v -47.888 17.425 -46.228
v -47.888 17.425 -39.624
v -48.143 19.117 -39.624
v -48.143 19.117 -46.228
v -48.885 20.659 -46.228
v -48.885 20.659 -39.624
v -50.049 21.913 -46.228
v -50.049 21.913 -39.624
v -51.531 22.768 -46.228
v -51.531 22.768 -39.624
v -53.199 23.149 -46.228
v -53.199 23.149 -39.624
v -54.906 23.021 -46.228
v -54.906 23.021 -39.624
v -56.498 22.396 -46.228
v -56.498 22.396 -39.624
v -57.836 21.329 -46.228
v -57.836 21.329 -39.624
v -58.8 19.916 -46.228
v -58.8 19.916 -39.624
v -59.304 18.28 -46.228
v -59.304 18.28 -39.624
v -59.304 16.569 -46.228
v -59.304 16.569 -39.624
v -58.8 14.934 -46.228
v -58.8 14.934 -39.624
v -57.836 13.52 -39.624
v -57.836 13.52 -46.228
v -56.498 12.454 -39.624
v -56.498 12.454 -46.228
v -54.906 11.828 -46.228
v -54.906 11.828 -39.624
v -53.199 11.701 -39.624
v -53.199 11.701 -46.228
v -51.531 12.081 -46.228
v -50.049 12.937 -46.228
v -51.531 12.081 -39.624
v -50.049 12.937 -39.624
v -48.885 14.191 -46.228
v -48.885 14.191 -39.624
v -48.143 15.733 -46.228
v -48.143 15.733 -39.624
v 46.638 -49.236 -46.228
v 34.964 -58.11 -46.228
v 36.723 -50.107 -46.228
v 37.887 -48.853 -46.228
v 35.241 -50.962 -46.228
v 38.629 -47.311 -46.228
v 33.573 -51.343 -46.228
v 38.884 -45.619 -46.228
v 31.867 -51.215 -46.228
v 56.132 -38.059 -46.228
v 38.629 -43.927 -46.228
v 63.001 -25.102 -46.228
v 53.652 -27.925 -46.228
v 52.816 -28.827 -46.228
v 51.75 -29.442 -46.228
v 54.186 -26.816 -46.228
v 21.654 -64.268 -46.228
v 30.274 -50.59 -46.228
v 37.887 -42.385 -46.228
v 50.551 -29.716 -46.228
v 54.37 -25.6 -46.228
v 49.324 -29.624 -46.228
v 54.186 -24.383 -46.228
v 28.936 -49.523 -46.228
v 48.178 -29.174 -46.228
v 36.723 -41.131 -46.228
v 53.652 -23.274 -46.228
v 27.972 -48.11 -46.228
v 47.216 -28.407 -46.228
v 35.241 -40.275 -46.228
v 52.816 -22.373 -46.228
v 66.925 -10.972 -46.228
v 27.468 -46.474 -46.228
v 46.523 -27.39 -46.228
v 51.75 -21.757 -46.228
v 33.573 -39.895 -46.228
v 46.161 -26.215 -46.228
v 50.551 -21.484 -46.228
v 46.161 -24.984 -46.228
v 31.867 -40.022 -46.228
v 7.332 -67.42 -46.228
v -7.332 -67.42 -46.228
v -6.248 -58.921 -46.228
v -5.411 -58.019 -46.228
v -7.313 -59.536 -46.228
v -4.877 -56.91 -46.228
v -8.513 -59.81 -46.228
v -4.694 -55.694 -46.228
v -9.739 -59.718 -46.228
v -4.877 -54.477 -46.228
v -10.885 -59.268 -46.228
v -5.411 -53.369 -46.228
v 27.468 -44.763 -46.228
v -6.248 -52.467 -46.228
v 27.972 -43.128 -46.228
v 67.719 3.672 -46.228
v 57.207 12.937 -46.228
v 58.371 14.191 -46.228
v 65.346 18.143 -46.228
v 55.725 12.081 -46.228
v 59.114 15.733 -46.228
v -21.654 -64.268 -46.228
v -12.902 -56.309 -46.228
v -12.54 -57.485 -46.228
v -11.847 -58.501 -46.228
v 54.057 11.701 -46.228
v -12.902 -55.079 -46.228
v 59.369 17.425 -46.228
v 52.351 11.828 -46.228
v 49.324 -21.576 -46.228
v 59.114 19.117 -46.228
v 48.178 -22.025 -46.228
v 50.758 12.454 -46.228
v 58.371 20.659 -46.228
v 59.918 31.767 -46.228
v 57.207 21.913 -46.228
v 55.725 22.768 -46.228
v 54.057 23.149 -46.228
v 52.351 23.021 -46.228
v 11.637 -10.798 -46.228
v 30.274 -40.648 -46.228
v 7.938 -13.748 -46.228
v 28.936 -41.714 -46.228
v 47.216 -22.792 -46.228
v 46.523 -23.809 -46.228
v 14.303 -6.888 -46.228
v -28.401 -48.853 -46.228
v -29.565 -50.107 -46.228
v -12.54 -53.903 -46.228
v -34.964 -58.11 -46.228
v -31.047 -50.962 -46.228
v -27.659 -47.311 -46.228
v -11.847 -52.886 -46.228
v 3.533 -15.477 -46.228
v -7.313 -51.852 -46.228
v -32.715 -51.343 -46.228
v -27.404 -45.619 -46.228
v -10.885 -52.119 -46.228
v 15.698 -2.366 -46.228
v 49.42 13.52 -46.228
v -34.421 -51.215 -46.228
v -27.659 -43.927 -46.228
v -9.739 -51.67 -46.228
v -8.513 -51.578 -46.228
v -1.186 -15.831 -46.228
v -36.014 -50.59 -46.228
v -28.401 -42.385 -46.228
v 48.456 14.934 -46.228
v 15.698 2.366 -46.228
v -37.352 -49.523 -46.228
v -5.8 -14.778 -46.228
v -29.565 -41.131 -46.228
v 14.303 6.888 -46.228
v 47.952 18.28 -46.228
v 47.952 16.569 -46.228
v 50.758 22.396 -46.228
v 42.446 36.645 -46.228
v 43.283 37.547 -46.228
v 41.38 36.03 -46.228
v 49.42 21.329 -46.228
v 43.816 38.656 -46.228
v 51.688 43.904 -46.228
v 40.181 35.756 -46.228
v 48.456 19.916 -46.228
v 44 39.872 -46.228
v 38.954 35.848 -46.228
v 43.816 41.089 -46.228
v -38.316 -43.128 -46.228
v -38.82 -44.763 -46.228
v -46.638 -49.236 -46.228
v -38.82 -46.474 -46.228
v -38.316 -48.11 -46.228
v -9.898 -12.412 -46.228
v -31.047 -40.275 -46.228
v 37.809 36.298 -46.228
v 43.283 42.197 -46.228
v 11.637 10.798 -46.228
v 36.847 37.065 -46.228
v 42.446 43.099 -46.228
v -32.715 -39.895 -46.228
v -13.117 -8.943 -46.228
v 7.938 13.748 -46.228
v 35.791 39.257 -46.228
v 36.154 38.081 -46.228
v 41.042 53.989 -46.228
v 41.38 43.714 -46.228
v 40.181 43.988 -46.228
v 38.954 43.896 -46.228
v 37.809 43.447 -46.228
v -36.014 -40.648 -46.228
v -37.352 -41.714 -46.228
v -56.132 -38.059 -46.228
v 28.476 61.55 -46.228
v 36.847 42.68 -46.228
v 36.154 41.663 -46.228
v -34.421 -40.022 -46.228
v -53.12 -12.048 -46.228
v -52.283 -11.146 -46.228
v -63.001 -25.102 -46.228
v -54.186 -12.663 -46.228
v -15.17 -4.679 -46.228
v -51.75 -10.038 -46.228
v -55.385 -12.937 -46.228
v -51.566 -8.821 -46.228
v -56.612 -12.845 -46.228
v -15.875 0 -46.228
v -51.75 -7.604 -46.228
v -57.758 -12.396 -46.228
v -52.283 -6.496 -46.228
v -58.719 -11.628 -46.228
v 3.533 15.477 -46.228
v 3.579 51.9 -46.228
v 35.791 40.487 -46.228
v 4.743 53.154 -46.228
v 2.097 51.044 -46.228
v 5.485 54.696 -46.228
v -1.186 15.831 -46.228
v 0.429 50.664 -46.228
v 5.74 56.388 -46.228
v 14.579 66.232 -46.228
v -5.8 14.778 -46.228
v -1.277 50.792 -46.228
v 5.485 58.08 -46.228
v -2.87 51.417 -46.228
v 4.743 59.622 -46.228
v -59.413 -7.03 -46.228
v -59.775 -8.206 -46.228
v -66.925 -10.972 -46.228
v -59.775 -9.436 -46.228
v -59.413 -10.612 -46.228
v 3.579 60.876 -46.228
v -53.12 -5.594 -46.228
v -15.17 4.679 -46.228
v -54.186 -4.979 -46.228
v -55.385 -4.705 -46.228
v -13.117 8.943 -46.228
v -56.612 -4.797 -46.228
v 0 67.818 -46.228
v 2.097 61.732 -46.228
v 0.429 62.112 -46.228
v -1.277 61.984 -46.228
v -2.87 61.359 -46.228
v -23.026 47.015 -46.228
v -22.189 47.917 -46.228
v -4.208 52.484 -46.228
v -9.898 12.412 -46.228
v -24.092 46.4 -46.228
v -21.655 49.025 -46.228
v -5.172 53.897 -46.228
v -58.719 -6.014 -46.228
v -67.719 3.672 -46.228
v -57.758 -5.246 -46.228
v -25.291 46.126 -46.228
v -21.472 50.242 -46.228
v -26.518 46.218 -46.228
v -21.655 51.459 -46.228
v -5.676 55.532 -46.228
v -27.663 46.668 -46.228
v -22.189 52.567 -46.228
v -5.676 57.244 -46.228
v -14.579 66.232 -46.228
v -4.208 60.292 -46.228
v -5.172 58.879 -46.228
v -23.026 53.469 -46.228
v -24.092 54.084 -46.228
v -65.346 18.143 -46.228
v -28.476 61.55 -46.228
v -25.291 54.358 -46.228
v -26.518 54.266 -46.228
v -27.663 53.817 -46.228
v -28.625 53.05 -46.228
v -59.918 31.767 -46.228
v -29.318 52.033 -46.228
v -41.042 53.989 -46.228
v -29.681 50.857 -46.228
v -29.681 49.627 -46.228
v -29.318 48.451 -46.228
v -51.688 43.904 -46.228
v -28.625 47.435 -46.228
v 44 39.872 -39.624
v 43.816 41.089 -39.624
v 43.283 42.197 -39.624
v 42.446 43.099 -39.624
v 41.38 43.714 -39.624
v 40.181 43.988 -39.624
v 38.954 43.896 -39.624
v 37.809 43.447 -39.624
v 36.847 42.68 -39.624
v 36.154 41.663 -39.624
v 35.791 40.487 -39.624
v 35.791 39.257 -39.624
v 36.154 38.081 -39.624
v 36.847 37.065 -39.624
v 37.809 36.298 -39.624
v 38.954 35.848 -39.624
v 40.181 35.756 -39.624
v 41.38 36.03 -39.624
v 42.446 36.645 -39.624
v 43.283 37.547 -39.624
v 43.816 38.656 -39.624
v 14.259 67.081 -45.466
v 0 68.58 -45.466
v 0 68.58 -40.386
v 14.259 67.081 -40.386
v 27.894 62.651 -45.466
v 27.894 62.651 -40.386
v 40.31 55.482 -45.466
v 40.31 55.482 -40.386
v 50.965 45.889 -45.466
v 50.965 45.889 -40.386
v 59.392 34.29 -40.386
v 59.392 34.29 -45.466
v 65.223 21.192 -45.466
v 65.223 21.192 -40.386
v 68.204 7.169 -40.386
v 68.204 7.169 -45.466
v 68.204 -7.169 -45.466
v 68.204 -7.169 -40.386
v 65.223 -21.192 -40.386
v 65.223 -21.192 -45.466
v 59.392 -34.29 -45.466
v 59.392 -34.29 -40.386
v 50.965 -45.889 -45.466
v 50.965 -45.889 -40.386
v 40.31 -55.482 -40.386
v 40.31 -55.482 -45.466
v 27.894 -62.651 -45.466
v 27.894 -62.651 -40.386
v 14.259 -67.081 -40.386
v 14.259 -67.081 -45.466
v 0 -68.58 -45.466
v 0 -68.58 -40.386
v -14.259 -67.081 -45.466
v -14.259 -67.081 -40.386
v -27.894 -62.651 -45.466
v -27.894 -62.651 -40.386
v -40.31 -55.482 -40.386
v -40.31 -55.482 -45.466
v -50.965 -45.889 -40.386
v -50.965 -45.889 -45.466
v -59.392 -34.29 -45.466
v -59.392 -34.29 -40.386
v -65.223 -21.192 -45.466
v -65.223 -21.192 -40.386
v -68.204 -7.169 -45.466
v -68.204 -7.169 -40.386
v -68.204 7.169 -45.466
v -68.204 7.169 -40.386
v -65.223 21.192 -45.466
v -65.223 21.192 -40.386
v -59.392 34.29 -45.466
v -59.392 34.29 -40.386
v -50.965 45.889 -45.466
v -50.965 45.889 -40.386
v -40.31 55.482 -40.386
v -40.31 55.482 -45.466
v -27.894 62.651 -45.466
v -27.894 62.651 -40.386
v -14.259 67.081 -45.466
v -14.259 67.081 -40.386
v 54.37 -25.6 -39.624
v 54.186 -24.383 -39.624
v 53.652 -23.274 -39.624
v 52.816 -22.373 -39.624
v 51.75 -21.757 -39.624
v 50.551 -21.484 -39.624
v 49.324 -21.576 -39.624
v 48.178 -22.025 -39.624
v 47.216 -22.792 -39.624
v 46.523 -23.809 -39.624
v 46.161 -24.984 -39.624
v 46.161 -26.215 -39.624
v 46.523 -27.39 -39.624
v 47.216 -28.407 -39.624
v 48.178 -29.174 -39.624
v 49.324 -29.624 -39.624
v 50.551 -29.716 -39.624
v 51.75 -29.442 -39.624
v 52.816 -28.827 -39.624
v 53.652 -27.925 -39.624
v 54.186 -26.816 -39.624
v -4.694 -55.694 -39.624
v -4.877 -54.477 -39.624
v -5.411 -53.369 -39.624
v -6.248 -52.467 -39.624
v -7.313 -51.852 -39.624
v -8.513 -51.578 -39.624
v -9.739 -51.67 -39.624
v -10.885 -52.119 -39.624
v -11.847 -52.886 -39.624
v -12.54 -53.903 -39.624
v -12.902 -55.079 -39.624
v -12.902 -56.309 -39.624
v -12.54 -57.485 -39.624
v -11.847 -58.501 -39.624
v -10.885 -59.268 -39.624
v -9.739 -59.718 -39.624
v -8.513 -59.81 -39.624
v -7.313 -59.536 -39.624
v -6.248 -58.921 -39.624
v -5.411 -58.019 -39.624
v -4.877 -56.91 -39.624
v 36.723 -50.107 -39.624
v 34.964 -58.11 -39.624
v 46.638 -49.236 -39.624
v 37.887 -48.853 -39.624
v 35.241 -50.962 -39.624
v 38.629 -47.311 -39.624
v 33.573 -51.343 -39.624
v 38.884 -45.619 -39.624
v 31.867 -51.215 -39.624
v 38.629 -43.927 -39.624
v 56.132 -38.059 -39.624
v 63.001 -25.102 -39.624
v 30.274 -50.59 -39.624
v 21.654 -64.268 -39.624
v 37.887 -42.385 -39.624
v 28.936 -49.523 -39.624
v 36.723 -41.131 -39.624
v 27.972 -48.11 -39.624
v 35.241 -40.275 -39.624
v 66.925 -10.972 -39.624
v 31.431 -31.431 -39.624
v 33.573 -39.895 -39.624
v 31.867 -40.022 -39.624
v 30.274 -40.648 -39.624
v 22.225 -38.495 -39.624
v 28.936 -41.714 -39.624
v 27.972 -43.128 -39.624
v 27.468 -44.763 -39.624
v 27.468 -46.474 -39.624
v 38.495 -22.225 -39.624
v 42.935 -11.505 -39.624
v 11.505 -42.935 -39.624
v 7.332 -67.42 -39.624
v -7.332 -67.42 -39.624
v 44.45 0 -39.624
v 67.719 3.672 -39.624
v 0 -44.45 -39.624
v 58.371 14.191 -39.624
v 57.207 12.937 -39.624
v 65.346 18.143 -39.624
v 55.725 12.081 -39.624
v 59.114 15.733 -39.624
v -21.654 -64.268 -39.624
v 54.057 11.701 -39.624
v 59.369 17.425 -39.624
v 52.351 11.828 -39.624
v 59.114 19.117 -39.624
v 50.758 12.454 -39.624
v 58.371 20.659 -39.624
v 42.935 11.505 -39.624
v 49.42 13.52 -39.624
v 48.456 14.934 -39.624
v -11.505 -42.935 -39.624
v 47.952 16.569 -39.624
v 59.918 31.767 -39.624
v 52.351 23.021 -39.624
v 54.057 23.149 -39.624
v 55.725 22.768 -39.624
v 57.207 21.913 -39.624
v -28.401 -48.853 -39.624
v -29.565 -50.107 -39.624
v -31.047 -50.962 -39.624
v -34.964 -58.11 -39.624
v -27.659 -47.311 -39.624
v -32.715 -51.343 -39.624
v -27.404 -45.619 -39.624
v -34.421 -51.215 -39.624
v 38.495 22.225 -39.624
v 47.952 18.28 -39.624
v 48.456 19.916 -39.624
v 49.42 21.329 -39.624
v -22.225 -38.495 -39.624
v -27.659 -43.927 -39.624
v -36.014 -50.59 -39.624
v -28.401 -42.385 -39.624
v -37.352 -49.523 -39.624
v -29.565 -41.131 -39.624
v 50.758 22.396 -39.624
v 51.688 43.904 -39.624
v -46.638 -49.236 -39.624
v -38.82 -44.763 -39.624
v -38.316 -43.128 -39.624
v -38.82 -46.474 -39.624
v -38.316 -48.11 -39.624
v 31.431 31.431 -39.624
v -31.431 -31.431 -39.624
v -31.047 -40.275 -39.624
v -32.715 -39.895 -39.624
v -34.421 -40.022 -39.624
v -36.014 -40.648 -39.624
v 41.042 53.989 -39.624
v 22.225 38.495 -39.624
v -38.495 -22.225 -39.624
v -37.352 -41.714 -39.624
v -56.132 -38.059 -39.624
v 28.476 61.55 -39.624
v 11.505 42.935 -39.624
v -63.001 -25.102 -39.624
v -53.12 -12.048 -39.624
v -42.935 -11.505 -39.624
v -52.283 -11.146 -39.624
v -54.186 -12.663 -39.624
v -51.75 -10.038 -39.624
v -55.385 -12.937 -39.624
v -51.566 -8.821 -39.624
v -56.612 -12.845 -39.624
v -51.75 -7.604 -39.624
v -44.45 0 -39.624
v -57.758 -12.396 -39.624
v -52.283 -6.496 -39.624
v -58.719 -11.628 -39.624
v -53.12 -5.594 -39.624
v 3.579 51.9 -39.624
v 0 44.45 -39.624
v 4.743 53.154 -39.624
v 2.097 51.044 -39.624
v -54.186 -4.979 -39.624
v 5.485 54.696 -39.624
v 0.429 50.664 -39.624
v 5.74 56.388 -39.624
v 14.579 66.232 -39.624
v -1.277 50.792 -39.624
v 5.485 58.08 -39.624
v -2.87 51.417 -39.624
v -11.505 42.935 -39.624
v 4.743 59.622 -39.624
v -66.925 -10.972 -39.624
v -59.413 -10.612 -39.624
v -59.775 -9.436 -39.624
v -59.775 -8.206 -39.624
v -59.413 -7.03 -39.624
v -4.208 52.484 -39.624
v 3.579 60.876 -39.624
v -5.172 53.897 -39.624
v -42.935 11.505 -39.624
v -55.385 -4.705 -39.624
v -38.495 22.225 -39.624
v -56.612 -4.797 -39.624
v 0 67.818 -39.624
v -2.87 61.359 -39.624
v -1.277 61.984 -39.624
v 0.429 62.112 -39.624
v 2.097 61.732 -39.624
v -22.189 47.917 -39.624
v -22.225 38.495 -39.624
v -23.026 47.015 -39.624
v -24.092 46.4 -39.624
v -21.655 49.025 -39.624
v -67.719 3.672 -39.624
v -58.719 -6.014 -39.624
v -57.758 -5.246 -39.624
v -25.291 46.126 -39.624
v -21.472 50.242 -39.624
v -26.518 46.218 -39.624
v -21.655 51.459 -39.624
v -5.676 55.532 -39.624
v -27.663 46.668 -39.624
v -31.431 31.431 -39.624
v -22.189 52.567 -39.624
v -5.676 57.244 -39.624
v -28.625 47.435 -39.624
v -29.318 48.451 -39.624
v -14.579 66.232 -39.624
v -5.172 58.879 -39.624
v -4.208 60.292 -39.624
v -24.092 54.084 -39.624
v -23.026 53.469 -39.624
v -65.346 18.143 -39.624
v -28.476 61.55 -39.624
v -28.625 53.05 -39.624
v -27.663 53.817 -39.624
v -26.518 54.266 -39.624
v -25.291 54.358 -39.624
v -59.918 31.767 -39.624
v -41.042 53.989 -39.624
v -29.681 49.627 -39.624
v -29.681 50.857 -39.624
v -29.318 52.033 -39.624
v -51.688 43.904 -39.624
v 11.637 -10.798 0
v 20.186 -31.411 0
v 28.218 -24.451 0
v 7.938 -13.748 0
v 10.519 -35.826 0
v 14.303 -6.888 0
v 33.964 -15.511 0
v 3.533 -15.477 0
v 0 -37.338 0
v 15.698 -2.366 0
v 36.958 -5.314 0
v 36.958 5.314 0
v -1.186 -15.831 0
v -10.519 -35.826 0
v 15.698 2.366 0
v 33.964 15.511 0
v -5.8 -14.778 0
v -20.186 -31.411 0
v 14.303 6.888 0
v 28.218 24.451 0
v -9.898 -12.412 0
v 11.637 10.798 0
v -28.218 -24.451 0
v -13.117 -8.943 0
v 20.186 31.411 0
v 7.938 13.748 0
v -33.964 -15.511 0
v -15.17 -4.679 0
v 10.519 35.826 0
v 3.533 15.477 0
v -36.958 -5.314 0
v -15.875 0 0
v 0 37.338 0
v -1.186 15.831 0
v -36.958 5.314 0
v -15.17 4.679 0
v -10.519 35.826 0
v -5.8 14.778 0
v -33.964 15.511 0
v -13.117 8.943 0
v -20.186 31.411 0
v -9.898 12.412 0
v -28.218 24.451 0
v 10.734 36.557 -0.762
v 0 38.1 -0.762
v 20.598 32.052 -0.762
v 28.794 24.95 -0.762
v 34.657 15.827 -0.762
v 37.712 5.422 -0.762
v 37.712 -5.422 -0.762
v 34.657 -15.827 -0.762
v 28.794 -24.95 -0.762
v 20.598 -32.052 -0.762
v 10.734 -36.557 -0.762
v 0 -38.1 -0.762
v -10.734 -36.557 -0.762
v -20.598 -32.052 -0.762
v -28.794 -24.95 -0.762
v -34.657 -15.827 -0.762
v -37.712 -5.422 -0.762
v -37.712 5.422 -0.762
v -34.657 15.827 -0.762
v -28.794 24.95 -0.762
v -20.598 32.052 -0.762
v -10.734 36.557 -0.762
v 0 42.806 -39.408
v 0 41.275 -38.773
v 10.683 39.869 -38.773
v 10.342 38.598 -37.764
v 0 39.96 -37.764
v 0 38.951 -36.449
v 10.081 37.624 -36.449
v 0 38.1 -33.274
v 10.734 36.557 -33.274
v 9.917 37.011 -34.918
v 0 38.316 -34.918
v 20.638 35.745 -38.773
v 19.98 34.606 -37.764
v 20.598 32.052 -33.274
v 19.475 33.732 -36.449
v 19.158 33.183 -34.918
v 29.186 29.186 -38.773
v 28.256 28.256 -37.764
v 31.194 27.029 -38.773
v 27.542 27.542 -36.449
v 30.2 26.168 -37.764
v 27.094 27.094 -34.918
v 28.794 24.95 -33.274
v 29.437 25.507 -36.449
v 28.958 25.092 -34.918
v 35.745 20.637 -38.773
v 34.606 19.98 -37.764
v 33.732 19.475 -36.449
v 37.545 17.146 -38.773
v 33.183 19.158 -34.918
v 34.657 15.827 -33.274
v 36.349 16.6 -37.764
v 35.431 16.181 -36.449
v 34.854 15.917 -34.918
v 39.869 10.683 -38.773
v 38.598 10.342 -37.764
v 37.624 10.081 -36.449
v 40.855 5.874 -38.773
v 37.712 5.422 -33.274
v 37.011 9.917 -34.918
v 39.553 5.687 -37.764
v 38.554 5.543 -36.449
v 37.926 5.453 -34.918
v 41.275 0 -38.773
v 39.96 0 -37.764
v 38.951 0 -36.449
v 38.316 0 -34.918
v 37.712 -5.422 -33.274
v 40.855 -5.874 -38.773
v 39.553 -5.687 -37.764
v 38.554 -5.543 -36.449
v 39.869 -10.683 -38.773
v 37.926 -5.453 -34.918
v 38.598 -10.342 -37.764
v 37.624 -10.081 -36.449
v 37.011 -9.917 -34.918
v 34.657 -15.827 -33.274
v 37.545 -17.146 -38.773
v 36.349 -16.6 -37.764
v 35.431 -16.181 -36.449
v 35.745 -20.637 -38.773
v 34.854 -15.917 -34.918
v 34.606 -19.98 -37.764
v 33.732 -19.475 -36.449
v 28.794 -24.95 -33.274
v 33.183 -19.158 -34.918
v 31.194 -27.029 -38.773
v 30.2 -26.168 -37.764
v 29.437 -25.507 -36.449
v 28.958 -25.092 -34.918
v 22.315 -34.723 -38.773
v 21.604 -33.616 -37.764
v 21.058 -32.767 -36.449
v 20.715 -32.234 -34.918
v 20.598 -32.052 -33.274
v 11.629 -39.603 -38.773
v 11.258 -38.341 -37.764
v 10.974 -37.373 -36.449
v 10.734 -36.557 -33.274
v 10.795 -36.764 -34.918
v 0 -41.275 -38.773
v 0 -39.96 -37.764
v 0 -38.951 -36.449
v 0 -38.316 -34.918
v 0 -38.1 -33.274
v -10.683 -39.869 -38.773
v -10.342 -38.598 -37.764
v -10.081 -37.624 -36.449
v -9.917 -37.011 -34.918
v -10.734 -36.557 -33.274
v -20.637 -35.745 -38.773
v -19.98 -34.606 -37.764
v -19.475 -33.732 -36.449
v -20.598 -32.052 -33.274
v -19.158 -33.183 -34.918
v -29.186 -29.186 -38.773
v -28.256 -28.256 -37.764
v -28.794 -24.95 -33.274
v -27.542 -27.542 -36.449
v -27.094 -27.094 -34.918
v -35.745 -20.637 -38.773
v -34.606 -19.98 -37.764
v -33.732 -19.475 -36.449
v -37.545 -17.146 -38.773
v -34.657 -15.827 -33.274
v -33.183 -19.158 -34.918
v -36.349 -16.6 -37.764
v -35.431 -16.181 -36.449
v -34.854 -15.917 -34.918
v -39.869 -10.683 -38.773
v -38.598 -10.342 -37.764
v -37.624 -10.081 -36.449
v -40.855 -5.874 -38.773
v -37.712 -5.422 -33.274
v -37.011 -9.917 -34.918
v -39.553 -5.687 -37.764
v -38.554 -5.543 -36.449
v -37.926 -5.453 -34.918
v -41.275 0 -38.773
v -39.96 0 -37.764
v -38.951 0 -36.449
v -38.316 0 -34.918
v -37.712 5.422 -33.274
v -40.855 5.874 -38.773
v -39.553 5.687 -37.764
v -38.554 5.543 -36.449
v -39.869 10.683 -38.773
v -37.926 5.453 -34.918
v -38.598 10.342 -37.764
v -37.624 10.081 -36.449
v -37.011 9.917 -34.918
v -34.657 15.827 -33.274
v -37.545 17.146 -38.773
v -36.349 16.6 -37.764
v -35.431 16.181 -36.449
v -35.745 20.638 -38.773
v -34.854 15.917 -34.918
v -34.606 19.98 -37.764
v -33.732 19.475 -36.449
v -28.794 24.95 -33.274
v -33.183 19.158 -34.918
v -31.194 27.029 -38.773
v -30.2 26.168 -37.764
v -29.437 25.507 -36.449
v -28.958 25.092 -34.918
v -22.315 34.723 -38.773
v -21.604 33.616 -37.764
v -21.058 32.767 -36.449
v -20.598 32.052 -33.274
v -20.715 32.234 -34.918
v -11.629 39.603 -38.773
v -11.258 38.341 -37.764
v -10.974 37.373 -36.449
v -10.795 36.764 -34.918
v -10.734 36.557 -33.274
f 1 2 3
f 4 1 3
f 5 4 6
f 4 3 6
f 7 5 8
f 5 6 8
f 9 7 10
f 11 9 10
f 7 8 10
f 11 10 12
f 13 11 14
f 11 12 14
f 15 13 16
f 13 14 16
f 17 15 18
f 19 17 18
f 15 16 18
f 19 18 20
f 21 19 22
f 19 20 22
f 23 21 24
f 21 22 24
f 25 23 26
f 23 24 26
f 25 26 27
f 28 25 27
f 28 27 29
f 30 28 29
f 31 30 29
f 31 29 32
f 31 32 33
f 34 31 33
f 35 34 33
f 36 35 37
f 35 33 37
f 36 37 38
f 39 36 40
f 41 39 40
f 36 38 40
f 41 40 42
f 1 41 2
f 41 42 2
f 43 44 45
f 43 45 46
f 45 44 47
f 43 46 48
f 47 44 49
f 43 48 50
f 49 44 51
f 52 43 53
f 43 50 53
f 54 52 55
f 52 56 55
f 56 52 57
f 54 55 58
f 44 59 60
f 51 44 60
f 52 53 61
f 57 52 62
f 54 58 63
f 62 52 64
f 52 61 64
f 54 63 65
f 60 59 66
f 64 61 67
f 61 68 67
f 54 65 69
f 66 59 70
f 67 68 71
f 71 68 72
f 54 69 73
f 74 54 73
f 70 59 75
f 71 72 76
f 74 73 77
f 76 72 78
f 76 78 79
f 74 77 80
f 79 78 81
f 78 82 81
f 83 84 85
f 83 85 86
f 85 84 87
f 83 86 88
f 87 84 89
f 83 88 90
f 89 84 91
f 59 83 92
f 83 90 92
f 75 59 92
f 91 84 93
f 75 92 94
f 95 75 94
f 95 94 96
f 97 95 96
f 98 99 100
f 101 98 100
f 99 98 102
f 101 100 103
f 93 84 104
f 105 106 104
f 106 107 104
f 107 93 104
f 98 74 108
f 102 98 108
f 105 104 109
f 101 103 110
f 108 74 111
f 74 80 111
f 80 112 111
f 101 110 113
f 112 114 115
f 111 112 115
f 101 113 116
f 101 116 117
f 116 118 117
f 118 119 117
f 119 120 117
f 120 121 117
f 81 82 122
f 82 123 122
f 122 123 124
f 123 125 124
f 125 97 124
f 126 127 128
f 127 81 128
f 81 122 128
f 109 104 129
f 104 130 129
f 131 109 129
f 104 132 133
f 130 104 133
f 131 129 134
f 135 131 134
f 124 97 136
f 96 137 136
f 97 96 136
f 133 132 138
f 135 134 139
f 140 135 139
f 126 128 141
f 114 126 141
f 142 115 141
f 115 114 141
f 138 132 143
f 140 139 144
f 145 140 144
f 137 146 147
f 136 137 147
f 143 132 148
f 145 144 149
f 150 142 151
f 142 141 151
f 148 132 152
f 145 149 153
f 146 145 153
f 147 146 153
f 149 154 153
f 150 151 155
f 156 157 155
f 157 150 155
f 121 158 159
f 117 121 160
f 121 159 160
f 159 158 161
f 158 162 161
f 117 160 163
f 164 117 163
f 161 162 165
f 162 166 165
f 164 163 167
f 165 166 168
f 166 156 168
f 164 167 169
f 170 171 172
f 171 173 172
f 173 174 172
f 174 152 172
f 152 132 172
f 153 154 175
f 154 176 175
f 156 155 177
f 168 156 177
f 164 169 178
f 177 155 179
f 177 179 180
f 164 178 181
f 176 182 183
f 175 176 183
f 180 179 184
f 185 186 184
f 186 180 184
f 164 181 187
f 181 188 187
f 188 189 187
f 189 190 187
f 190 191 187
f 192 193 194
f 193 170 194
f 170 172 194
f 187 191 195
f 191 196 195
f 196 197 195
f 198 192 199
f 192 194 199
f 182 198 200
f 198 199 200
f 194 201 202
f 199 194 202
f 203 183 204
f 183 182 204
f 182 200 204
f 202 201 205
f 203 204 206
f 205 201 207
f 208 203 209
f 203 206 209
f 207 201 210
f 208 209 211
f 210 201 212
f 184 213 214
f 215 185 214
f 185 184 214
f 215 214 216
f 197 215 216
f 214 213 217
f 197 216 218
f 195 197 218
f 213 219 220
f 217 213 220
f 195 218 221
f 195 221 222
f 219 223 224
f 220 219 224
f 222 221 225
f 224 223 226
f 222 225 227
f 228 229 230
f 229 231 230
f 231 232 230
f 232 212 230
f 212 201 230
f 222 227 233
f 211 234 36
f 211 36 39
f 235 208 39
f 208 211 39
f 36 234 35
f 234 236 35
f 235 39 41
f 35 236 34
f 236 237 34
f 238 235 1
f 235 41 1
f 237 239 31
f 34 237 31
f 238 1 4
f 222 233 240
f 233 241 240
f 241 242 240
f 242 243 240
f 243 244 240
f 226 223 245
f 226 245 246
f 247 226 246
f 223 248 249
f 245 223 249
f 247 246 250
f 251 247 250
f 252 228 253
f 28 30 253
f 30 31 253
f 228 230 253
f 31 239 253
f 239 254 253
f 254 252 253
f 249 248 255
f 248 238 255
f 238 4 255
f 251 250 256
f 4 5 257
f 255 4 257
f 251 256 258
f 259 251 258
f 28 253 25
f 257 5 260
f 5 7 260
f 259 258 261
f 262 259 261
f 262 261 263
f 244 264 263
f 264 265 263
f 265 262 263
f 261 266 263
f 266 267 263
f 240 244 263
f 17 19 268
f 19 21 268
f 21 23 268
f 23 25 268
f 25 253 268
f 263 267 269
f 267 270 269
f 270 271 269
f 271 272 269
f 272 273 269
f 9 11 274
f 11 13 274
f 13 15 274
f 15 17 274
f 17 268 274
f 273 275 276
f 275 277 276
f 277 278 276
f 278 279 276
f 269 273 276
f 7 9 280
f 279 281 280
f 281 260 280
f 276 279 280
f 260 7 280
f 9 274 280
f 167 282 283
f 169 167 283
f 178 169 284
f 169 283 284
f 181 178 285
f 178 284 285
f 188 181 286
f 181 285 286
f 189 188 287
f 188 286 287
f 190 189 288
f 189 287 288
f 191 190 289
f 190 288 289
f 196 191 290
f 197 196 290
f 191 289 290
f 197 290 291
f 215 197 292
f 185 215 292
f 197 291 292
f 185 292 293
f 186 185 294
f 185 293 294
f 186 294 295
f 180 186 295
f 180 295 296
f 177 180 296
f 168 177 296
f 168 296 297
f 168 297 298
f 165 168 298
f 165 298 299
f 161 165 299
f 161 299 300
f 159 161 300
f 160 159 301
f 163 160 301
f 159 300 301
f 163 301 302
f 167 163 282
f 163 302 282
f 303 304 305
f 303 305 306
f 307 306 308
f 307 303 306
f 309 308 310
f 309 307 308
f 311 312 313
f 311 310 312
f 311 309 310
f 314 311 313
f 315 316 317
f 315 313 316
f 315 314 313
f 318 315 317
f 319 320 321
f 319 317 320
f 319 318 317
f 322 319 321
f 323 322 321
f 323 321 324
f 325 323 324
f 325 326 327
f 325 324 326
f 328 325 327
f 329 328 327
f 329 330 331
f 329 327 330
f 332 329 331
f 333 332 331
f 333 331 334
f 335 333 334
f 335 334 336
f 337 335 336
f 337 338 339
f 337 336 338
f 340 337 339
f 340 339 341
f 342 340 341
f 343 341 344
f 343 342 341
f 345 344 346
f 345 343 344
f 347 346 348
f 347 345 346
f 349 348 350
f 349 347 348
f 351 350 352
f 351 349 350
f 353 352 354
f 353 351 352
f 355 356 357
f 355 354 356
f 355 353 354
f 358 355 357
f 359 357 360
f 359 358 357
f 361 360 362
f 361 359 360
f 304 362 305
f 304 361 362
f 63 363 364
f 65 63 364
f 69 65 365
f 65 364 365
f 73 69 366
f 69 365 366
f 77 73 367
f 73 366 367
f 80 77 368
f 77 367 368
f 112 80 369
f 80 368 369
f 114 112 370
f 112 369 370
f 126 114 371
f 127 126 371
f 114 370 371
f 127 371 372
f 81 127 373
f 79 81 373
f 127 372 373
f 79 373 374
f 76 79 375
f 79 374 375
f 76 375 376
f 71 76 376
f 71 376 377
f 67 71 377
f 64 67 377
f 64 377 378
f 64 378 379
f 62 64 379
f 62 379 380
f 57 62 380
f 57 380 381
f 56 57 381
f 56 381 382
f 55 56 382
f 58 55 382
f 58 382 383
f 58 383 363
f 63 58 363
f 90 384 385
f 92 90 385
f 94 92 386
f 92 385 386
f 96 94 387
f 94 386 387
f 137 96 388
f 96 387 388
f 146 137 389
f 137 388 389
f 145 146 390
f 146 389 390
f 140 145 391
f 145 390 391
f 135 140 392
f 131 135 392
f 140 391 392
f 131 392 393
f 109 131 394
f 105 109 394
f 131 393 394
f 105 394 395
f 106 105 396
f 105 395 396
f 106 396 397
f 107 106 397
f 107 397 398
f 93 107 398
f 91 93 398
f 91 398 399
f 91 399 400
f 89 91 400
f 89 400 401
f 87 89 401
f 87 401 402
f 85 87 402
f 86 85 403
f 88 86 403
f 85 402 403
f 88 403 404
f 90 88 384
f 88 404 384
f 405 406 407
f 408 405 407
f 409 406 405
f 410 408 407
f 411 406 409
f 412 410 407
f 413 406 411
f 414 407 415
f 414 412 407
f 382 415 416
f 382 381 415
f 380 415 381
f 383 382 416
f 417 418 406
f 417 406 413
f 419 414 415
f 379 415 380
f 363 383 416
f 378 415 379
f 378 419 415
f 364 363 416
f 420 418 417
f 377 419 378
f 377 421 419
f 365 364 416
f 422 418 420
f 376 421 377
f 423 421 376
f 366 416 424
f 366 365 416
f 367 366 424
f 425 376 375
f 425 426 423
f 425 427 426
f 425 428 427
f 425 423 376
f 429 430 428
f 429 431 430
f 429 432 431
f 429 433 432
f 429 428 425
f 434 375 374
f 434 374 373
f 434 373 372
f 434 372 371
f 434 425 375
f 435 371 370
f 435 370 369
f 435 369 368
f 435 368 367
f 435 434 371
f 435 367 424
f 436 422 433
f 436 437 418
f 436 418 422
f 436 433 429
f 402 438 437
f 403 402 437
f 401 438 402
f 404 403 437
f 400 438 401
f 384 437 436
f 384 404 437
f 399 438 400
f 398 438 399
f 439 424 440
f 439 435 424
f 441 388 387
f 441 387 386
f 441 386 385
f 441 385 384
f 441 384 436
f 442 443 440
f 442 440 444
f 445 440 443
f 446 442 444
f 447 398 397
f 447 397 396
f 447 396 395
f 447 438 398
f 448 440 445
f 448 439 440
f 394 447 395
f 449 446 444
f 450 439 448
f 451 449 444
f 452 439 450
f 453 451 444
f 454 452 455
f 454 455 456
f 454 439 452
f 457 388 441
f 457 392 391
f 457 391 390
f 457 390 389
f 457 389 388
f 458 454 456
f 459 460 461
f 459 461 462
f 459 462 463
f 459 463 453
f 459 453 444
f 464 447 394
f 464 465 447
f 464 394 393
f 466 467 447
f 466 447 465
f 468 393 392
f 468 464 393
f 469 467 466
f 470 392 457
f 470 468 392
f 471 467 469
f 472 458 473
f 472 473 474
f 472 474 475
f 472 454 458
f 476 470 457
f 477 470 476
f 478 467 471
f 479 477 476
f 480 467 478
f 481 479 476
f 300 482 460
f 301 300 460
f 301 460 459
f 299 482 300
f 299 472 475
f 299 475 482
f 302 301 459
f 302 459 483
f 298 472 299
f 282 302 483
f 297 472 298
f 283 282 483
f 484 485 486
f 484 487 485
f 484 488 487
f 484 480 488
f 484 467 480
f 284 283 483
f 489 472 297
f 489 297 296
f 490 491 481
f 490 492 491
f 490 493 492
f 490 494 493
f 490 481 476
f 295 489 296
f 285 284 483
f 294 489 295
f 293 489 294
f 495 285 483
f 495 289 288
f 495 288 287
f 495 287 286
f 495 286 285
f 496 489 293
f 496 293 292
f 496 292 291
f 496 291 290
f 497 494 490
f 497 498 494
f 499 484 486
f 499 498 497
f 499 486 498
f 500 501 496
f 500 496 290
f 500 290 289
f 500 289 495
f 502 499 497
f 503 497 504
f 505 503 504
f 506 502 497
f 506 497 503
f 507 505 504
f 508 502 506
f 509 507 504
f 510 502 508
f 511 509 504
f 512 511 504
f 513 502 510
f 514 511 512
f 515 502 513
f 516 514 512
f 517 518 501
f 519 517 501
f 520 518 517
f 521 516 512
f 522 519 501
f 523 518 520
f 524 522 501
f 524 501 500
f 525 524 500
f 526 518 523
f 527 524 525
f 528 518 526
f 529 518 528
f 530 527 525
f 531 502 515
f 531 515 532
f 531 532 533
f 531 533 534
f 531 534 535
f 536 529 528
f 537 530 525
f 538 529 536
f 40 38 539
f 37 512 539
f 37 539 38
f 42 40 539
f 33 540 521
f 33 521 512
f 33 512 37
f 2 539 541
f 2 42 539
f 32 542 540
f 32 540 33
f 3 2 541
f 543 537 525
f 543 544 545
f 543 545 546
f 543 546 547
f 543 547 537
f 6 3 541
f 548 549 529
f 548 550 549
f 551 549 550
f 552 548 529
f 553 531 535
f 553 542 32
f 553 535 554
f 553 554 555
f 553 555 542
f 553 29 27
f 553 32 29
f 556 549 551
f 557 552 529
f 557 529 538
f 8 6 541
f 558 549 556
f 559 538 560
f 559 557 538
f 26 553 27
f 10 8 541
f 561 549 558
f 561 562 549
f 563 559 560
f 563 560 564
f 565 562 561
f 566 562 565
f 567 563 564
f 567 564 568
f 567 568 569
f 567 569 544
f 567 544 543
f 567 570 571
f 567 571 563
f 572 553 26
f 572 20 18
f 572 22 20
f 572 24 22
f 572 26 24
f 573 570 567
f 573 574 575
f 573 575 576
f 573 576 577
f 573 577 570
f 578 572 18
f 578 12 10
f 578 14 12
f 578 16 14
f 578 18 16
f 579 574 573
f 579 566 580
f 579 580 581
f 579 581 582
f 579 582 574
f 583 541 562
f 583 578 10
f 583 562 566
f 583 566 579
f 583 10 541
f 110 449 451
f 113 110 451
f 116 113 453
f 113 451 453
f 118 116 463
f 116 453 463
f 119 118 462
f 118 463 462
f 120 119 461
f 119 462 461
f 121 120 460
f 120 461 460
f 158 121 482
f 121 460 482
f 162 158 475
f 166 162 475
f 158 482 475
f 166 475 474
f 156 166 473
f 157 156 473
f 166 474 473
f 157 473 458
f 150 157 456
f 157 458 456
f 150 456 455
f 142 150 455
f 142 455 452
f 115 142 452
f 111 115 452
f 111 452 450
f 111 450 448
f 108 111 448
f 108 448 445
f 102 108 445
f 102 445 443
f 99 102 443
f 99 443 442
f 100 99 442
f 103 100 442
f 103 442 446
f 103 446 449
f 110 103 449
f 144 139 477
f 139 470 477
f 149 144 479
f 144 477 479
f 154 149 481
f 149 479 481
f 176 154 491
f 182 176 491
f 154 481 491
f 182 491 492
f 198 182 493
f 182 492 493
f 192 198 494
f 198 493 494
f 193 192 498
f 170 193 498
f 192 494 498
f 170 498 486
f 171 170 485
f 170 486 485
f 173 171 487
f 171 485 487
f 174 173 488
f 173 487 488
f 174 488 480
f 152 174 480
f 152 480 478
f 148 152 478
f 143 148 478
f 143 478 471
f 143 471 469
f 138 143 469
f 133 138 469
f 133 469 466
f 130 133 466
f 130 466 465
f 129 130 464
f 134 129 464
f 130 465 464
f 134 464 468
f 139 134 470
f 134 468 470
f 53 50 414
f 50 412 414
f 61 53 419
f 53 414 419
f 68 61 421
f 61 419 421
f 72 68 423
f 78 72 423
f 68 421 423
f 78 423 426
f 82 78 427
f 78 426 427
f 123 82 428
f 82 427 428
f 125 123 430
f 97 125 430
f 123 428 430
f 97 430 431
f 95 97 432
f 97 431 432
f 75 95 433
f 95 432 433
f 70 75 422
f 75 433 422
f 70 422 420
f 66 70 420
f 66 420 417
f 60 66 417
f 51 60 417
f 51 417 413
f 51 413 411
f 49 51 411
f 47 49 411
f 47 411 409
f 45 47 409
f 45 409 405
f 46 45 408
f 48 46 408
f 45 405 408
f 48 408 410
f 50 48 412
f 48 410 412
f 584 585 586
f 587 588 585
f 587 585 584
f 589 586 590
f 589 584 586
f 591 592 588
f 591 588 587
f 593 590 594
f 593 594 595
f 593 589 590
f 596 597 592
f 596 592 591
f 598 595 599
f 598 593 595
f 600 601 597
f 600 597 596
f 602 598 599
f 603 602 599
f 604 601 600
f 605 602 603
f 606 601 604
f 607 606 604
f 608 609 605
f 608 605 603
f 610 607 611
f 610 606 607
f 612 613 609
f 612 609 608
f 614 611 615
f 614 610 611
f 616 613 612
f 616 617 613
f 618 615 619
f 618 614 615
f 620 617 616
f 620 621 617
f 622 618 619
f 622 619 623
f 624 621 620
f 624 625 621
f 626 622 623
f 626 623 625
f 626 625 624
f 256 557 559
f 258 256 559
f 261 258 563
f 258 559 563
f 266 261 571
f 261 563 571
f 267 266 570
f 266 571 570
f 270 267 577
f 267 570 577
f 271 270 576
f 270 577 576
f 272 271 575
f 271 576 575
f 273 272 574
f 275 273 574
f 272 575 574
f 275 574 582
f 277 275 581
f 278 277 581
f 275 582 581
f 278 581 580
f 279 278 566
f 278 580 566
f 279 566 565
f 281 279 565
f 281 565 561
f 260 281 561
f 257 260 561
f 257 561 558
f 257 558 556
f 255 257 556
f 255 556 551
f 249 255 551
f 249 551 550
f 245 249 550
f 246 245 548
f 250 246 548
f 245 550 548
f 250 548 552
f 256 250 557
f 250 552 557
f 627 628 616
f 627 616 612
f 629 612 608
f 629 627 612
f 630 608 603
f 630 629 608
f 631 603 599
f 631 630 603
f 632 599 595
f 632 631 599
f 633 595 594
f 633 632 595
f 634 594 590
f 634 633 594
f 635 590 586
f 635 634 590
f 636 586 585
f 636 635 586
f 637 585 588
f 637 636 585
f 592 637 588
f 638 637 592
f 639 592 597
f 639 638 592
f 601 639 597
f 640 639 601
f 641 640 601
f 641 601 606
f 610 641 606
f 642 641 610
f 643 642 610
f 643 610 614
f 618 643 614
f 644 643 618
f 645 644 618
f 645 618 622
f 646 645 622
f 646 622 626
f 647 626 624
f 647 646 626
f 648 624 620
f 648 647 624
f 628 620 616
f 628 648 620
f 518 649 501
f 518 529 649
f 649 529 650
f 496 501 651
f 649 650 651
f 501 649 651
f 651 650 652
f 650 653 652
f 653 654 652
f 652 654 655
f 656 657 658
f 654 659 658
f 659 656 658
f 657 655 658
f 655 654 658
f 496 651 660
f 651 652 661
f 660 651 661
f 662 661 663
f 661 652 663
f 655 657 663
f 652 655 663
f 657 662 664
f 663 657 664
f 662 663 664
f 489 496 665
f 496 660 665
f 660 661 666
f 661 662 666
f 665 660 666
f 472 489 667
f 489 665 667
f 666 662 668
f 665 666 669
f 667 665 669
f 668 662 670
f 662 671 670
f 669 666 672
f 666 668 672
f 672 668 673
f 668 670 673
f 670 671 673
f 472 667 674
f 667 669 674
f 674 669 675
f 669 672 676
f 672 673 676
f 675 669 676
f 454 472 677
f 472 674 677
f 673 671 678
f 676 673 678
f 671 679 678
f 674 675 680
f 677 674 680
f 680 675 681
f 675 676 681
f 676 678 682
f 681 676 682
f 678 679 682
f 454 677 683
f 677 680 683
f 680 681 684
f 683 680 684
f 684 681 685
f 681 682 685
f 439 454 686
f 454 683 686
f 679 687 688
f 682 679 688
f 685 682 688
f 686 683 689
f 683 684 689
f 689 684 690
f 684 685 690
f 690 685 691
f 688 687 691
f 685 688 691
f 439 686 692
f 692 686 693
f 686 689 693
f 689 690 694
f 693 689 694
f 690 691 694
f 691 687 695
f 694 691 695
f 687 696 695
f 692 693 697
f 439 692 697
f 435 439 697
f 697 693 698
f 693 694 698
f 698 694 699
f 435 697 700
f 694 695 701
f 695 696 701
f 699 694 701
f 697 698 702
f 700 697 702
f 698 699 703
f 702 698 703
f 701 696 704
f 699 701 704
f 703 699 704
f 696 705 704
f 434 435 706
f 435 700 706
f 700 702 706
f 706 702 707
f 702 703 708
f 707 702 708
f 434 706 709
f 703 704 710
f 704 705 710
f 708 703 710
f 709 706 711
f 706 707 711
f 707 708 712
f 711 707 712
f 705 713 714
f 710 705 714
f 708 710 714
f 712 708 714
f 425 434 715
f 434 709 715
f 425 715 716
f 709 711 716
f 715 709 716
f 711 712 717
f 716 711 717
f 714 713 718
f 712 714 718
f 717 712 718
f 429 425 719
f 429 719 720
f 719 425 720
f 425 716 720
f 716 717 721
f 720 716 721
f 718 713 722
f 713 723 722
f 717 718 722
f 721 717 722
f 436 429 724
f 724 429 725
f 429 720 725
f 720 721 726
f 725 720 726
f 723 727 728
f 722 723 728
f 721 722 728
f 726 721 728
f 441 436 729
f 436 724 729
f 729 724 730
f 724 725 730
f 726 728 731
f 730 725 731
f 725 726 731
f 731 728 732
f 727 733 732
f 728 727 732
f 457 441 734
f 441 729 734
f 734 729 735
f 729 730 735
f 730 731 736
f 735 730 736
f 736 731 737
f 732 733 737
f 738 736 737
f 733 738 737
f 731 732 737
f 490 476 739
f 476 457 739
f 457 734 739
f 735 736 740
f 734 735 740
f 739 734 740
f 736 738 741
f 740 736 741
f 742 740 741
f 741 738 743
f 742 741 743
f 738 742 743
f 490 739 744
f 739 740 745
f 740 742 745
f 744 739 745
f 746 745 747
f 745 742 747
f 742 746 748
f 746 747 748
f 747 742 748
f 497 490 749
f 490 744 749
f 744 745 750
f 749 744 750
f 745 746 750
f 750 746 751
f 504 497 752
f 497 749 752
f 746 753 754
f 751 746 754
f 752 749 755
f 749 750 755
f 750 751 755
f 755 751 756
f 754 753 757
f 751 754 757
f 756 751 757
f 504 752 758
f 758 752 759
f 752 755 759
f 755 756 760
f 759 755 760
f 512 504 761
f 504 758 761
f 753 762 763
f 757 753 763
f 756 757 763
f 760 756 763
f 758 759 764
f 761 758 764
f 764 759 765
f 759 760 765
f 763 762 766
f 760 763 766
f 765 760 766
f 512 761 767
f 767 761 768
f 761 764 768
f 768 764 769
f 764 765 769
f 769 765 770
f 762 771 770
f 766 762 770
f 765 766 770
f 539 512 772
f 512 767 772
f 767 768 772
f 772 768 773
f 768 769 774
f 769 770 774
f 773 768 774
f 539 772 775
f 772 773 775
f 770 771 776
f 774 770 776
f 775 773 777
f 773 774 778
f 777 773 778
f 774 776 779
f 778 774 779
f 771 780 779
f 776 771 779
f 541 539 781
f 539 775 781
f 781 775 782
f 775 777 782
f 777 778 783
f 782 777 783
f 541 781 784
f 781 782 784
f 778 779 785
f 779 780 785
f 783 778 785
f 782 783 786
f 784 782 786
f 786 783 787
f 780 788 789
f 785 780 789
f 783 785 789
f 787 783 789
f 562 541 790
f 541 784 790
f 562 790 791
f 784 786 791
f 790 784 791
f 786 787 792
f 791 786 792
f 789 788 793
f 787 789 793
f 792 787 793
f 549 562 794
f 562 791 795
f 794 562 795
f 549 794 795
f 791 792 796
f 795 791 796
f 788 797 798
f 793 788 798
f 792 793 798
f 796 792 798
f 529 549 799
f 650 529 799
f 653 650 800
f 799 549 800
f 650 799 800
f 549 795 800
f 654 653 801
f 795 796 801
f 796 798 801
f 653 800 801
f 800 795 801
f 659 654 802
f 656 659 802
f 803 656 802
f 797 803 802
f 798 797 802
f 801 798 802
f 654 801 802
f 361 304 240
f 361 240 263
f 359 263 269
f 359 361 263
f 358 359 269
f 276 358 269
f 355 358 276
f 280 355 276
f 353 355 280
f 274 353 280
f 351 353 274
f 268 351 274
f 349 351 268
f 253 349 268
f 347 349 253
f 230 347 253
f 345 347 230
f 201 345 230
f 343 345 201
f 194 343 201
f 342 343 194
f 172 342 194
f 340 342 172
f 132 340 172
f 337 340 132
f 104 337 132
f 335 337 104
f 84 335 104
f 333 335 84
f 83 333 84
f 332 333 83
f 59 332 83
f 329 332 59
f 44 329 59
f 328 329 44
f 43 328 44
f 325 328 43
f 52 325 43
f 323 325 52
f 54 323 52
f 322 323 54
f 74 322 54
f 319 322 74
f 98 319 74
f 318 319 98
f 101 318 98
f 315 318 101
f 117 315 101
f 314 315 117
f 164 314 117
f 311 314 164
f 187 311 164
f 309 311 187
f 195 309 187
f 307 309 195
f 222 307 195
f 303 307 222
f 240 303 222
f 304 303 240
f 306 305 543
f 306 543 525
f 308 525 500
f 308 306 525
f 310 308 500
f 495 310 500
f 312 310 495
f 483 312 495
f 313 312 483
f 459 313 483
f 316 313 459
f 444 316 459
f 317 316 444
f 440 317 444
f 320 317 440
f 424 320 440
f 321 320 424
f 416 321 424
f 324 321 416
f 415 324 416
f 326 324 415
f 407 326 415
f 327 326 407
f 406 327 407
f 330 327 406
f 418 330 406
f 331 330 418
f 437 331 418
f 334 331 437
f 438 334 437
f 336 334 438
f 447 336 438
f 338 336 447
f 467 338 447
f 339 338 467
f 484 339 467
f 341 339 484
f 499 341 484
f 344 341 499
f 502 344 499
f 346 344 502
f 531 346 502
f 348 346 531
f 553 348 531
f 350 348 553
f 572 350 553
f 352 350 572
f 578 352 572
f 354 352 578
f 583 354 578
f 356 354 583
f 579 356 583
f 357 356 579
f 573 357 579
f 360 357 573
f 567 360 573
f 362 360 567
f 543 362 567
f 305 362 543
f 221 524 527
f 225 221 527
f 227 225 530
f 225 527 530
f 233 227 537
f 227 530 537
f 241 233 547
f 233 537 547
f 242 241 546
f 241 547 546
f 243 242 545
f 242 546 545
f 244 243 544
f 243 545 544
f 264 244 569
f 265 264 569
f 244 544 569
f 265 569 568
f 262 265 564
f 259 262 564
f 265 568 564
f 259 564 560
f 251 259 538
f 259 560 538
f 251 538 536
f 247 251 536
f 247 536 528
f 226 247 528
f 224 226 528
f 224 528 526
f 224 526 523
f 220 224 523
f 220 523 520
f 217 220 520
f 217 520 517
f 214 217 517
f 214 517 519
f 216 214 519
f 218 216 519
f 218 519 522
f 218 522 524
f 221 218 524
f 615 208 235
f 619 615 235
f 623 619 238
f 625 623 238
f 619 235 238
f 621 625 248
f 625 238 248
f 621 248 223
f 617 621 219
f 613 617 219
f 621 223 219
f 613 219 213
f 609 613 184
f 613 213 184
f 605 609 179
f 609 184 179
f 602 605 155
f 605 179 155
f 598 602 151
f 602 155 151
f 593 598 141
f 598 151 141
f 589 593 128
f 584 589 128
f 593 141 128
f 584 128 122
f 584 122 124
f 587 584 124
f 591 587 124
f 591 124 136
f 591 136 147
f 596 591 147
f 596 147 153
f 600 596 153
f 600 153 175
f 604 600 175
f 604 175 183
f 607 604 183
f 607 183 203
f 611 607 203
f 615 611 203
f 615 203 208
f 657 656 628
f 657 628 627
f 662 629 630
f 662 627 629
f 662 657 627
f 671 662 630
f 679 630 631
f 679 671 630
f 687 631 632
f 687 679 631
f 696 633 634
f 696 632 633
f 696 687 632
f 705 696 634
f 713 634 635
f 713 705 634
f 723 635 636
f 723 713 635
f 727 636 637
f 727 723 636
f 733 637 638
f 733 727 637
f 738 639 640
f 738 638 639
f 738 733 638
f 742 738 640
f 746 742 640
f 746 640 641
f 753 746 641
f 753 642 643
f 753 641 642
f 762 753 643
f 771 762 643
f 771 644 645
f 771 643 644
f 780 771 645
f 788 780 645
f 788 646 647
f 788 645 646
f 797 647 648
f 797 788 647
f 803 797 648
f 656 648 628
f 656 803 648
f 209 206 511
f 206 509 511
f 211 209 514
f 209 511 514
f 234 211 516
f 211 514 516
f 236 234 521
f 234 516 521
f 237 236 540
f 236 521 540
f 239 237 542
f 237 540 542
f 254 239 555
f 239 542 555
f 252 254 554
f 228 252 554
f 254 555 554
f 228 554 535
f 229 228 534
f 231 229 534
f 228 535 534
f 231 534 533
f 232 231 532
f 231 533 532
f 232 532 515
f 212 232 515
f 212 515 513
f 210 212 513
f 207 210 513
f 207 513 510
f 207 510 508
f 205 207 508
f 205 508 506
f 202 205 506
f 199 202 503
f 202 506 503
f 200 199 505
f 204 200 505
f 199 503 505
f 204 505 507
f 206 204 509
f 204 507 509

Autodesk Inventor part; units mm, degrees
ref_plane "YZ Plane" through (0, 0, 0) normal (1, 0, 0) x (0, 1, 0)
ref_plane "XZ Plane" through (0, 0, 0) normal (0, 1, 0) x (-1, 0, 0)
ref_plane "XY Plane" through (0, 0, 0) normal (0, 0, 1) x (1, 0, 0)
sketch "Sketch1" plane through (0, 0, 0) normal (1, 0, 0) x (0, 1, 0)
  line L0 (0, 0) -> (38.1, 0)
  line L1 (38.1, 0) -> (38.1, -39.624)
  line L2 (38.1, -39.624) -> (68.58, -39.624)
  line L3 (68.58, -39.624) -> (68.58, -46.228)
  line L4 (68.58, -46.228) -> (32.512, -46.228)
  line L5 (32.512, -46.228) -> (32.512, -51.308)
  line L6 (32.512, -51.308) -> (28.448, -51.308)
  line L7 (28.448, -51.308) -> (28.448, -64.516)
  line L8 (28.448, -64.516) -> (0, -64.516)
  line L9 (0, -64.516) -> (0, 0)
  dimension "d0" = 38.1
  dimension "d1" = 39.624
  dimension "d2" = 30.48
  dimension "d3" = 6.604
  dimension "d4" = 36.068
  dimension "d5" = 5.08
  dimension "d6" = 4.064
  dimension "d7" = 13.208
revolve "Revolution1" add sketch "Sketch1" angle 360 about axis through (0, 0, -64.516) along (0, 0, 1)
sketch "Sketch2" plane through (0, 0, -64.516) normal (0, 0, -1) x (-1, 0, 0)
  circle A0 centre (0, 0) radius 25.4
  dimension "d9" = 50.8
extrude "Extrusion1" cut sketch "Sketch2" against normal up to surface (18.288 mm away)
sketch "Sketch3" plane through (0, 0, -46.228) normal (0, 0, -1) x (-1, 0, 0)
  circle A0 centre (0, 0) radius 15.875
  dimension "d12" = 31.75
extrude "Extrusion2" cut sketch "Sketch3" against normal up to surface (46.228 mm away)
fillet "Fillet1" radius 1.905 2 edges at (0, -28.448, -51.308) (0, -32.512, -46.228)
chamfer "Chamfer1" distance 0.762 angle 45 5 edges at (0, -68.58, -46.228) (0, -68.58, -39.624) (0, -38.1, 0) (0, -32.512, -51.308) (0, -28.448, -64.516)
fillet "Fillet2" radius 6.35 1 edges at (0, -38.1, -39.624)
sketch "Sketch4" plane through (0, 0, -39.624) normal (0, 0, 1) x (1, 0, 0)
  line L0 (1.6378, 0) -> (0, 0)
  line L1 (0, 0) -> (0, 80.9396)
  circle A0 centre (0, 56.388) radius 5.7404
  circle A1 centre (0, 0) radius 68.58
  line L2 (0, 68.58) -> (-43.6157, 68.58)
  circle A2 centre (53.6282, 17.4249) radius 5.7404
  circle A3 centre (33.144, -45.6189) radius 5.7404
  circle A4 centre (-33.144, -45.6189) radius 5.7404
  circle A5 centre (-53.6282, 17.4249) radius 5.7404
  line L3 (0, 0) -> (47.9546, 47.9546)
  circle A6 centre (0, 0) radius 67.818
  line L4 (0, 0) -> (67.818, 0) construction
  circle A7 centre (0, 0) radius 44.45
  arc A8 (53.6282, 17.4249) -> (0, 56.388) centre (0, 0) ccw
  circle A9 centre (39.8723, 39.8723) radius 2.54
  dimension "d20" = 11.4808
  dimension "d21" = 12.192
  dimension "d24" = 360
  dimension "d26" = 45
  dimension "d27" = 5.08
extrude "Extrusion3" cut sketch "Sketch4" against normal up to surface (6.604 mm away) contours A2 | A0 L1 | L1 A8 A0 | A9 A8 L3 | L3 A8 A9 | L1 A0 A8 | A8 A9 L3 | L3 A9 A8 | A3 | A4 | A5
thread "Thread1"
thread "Thread2"
thread "Thread3"
thread "Thread4"
thread "Thread5"
thread "Thread6"
sketch "Sketch5" plane through (0, 0, -46.228) normal (0, 0, -1) x (-1, 0, 0)
  circle A0 centre (0, 0) radius 44.45
  point P0 (0, 0)
extrude "Extrusion4" cut sketch "Sketch5" along normal up to surface (18.288 mm away)
sketch "Sketch6" plane through (0, 0, -39.624) normal (0, 0, 1) x (1, 0, 0)
  circle A0 centre (0, 56.388) radius 5.7404
  circle A1 centre (0, 0) radius 56.388
  circle A2 centre (39.8723, 39.8723) radius 2.54
  circle A3 centre (39.8723, 39.8723) radius 4.1275
  circle A4 centre (-25.5996, 50.2421) radius 4.1275
  circle A5 centre (-55.6938, -8.821) radius 4.1275
  circle A6 centre (-8.821, -55.6938) radius 4.1275
  circle A7 centre (50.2421, -25.5996) radius 4.1275
  point P0 (0, 0)
  dimension "d44" = 8.255
  dimension "d47" = 360
extrude "Extrusion5" cut sketch "Sketch6" against normal blind 25.4 contours A4 A1 | A1 A4 | A3 A1 A2 | A1 A2 A3 | A5 A1 | A1 A5 | A7 A1 | A1 A7 | A6 A1 | A1 A6
thread "Thread7"
thread "Thread8"
thread "Thread9"
thread "Thread10"
thread "Thread11"
equation "\"d28\" = d27"
properties part number "DTR-1"
